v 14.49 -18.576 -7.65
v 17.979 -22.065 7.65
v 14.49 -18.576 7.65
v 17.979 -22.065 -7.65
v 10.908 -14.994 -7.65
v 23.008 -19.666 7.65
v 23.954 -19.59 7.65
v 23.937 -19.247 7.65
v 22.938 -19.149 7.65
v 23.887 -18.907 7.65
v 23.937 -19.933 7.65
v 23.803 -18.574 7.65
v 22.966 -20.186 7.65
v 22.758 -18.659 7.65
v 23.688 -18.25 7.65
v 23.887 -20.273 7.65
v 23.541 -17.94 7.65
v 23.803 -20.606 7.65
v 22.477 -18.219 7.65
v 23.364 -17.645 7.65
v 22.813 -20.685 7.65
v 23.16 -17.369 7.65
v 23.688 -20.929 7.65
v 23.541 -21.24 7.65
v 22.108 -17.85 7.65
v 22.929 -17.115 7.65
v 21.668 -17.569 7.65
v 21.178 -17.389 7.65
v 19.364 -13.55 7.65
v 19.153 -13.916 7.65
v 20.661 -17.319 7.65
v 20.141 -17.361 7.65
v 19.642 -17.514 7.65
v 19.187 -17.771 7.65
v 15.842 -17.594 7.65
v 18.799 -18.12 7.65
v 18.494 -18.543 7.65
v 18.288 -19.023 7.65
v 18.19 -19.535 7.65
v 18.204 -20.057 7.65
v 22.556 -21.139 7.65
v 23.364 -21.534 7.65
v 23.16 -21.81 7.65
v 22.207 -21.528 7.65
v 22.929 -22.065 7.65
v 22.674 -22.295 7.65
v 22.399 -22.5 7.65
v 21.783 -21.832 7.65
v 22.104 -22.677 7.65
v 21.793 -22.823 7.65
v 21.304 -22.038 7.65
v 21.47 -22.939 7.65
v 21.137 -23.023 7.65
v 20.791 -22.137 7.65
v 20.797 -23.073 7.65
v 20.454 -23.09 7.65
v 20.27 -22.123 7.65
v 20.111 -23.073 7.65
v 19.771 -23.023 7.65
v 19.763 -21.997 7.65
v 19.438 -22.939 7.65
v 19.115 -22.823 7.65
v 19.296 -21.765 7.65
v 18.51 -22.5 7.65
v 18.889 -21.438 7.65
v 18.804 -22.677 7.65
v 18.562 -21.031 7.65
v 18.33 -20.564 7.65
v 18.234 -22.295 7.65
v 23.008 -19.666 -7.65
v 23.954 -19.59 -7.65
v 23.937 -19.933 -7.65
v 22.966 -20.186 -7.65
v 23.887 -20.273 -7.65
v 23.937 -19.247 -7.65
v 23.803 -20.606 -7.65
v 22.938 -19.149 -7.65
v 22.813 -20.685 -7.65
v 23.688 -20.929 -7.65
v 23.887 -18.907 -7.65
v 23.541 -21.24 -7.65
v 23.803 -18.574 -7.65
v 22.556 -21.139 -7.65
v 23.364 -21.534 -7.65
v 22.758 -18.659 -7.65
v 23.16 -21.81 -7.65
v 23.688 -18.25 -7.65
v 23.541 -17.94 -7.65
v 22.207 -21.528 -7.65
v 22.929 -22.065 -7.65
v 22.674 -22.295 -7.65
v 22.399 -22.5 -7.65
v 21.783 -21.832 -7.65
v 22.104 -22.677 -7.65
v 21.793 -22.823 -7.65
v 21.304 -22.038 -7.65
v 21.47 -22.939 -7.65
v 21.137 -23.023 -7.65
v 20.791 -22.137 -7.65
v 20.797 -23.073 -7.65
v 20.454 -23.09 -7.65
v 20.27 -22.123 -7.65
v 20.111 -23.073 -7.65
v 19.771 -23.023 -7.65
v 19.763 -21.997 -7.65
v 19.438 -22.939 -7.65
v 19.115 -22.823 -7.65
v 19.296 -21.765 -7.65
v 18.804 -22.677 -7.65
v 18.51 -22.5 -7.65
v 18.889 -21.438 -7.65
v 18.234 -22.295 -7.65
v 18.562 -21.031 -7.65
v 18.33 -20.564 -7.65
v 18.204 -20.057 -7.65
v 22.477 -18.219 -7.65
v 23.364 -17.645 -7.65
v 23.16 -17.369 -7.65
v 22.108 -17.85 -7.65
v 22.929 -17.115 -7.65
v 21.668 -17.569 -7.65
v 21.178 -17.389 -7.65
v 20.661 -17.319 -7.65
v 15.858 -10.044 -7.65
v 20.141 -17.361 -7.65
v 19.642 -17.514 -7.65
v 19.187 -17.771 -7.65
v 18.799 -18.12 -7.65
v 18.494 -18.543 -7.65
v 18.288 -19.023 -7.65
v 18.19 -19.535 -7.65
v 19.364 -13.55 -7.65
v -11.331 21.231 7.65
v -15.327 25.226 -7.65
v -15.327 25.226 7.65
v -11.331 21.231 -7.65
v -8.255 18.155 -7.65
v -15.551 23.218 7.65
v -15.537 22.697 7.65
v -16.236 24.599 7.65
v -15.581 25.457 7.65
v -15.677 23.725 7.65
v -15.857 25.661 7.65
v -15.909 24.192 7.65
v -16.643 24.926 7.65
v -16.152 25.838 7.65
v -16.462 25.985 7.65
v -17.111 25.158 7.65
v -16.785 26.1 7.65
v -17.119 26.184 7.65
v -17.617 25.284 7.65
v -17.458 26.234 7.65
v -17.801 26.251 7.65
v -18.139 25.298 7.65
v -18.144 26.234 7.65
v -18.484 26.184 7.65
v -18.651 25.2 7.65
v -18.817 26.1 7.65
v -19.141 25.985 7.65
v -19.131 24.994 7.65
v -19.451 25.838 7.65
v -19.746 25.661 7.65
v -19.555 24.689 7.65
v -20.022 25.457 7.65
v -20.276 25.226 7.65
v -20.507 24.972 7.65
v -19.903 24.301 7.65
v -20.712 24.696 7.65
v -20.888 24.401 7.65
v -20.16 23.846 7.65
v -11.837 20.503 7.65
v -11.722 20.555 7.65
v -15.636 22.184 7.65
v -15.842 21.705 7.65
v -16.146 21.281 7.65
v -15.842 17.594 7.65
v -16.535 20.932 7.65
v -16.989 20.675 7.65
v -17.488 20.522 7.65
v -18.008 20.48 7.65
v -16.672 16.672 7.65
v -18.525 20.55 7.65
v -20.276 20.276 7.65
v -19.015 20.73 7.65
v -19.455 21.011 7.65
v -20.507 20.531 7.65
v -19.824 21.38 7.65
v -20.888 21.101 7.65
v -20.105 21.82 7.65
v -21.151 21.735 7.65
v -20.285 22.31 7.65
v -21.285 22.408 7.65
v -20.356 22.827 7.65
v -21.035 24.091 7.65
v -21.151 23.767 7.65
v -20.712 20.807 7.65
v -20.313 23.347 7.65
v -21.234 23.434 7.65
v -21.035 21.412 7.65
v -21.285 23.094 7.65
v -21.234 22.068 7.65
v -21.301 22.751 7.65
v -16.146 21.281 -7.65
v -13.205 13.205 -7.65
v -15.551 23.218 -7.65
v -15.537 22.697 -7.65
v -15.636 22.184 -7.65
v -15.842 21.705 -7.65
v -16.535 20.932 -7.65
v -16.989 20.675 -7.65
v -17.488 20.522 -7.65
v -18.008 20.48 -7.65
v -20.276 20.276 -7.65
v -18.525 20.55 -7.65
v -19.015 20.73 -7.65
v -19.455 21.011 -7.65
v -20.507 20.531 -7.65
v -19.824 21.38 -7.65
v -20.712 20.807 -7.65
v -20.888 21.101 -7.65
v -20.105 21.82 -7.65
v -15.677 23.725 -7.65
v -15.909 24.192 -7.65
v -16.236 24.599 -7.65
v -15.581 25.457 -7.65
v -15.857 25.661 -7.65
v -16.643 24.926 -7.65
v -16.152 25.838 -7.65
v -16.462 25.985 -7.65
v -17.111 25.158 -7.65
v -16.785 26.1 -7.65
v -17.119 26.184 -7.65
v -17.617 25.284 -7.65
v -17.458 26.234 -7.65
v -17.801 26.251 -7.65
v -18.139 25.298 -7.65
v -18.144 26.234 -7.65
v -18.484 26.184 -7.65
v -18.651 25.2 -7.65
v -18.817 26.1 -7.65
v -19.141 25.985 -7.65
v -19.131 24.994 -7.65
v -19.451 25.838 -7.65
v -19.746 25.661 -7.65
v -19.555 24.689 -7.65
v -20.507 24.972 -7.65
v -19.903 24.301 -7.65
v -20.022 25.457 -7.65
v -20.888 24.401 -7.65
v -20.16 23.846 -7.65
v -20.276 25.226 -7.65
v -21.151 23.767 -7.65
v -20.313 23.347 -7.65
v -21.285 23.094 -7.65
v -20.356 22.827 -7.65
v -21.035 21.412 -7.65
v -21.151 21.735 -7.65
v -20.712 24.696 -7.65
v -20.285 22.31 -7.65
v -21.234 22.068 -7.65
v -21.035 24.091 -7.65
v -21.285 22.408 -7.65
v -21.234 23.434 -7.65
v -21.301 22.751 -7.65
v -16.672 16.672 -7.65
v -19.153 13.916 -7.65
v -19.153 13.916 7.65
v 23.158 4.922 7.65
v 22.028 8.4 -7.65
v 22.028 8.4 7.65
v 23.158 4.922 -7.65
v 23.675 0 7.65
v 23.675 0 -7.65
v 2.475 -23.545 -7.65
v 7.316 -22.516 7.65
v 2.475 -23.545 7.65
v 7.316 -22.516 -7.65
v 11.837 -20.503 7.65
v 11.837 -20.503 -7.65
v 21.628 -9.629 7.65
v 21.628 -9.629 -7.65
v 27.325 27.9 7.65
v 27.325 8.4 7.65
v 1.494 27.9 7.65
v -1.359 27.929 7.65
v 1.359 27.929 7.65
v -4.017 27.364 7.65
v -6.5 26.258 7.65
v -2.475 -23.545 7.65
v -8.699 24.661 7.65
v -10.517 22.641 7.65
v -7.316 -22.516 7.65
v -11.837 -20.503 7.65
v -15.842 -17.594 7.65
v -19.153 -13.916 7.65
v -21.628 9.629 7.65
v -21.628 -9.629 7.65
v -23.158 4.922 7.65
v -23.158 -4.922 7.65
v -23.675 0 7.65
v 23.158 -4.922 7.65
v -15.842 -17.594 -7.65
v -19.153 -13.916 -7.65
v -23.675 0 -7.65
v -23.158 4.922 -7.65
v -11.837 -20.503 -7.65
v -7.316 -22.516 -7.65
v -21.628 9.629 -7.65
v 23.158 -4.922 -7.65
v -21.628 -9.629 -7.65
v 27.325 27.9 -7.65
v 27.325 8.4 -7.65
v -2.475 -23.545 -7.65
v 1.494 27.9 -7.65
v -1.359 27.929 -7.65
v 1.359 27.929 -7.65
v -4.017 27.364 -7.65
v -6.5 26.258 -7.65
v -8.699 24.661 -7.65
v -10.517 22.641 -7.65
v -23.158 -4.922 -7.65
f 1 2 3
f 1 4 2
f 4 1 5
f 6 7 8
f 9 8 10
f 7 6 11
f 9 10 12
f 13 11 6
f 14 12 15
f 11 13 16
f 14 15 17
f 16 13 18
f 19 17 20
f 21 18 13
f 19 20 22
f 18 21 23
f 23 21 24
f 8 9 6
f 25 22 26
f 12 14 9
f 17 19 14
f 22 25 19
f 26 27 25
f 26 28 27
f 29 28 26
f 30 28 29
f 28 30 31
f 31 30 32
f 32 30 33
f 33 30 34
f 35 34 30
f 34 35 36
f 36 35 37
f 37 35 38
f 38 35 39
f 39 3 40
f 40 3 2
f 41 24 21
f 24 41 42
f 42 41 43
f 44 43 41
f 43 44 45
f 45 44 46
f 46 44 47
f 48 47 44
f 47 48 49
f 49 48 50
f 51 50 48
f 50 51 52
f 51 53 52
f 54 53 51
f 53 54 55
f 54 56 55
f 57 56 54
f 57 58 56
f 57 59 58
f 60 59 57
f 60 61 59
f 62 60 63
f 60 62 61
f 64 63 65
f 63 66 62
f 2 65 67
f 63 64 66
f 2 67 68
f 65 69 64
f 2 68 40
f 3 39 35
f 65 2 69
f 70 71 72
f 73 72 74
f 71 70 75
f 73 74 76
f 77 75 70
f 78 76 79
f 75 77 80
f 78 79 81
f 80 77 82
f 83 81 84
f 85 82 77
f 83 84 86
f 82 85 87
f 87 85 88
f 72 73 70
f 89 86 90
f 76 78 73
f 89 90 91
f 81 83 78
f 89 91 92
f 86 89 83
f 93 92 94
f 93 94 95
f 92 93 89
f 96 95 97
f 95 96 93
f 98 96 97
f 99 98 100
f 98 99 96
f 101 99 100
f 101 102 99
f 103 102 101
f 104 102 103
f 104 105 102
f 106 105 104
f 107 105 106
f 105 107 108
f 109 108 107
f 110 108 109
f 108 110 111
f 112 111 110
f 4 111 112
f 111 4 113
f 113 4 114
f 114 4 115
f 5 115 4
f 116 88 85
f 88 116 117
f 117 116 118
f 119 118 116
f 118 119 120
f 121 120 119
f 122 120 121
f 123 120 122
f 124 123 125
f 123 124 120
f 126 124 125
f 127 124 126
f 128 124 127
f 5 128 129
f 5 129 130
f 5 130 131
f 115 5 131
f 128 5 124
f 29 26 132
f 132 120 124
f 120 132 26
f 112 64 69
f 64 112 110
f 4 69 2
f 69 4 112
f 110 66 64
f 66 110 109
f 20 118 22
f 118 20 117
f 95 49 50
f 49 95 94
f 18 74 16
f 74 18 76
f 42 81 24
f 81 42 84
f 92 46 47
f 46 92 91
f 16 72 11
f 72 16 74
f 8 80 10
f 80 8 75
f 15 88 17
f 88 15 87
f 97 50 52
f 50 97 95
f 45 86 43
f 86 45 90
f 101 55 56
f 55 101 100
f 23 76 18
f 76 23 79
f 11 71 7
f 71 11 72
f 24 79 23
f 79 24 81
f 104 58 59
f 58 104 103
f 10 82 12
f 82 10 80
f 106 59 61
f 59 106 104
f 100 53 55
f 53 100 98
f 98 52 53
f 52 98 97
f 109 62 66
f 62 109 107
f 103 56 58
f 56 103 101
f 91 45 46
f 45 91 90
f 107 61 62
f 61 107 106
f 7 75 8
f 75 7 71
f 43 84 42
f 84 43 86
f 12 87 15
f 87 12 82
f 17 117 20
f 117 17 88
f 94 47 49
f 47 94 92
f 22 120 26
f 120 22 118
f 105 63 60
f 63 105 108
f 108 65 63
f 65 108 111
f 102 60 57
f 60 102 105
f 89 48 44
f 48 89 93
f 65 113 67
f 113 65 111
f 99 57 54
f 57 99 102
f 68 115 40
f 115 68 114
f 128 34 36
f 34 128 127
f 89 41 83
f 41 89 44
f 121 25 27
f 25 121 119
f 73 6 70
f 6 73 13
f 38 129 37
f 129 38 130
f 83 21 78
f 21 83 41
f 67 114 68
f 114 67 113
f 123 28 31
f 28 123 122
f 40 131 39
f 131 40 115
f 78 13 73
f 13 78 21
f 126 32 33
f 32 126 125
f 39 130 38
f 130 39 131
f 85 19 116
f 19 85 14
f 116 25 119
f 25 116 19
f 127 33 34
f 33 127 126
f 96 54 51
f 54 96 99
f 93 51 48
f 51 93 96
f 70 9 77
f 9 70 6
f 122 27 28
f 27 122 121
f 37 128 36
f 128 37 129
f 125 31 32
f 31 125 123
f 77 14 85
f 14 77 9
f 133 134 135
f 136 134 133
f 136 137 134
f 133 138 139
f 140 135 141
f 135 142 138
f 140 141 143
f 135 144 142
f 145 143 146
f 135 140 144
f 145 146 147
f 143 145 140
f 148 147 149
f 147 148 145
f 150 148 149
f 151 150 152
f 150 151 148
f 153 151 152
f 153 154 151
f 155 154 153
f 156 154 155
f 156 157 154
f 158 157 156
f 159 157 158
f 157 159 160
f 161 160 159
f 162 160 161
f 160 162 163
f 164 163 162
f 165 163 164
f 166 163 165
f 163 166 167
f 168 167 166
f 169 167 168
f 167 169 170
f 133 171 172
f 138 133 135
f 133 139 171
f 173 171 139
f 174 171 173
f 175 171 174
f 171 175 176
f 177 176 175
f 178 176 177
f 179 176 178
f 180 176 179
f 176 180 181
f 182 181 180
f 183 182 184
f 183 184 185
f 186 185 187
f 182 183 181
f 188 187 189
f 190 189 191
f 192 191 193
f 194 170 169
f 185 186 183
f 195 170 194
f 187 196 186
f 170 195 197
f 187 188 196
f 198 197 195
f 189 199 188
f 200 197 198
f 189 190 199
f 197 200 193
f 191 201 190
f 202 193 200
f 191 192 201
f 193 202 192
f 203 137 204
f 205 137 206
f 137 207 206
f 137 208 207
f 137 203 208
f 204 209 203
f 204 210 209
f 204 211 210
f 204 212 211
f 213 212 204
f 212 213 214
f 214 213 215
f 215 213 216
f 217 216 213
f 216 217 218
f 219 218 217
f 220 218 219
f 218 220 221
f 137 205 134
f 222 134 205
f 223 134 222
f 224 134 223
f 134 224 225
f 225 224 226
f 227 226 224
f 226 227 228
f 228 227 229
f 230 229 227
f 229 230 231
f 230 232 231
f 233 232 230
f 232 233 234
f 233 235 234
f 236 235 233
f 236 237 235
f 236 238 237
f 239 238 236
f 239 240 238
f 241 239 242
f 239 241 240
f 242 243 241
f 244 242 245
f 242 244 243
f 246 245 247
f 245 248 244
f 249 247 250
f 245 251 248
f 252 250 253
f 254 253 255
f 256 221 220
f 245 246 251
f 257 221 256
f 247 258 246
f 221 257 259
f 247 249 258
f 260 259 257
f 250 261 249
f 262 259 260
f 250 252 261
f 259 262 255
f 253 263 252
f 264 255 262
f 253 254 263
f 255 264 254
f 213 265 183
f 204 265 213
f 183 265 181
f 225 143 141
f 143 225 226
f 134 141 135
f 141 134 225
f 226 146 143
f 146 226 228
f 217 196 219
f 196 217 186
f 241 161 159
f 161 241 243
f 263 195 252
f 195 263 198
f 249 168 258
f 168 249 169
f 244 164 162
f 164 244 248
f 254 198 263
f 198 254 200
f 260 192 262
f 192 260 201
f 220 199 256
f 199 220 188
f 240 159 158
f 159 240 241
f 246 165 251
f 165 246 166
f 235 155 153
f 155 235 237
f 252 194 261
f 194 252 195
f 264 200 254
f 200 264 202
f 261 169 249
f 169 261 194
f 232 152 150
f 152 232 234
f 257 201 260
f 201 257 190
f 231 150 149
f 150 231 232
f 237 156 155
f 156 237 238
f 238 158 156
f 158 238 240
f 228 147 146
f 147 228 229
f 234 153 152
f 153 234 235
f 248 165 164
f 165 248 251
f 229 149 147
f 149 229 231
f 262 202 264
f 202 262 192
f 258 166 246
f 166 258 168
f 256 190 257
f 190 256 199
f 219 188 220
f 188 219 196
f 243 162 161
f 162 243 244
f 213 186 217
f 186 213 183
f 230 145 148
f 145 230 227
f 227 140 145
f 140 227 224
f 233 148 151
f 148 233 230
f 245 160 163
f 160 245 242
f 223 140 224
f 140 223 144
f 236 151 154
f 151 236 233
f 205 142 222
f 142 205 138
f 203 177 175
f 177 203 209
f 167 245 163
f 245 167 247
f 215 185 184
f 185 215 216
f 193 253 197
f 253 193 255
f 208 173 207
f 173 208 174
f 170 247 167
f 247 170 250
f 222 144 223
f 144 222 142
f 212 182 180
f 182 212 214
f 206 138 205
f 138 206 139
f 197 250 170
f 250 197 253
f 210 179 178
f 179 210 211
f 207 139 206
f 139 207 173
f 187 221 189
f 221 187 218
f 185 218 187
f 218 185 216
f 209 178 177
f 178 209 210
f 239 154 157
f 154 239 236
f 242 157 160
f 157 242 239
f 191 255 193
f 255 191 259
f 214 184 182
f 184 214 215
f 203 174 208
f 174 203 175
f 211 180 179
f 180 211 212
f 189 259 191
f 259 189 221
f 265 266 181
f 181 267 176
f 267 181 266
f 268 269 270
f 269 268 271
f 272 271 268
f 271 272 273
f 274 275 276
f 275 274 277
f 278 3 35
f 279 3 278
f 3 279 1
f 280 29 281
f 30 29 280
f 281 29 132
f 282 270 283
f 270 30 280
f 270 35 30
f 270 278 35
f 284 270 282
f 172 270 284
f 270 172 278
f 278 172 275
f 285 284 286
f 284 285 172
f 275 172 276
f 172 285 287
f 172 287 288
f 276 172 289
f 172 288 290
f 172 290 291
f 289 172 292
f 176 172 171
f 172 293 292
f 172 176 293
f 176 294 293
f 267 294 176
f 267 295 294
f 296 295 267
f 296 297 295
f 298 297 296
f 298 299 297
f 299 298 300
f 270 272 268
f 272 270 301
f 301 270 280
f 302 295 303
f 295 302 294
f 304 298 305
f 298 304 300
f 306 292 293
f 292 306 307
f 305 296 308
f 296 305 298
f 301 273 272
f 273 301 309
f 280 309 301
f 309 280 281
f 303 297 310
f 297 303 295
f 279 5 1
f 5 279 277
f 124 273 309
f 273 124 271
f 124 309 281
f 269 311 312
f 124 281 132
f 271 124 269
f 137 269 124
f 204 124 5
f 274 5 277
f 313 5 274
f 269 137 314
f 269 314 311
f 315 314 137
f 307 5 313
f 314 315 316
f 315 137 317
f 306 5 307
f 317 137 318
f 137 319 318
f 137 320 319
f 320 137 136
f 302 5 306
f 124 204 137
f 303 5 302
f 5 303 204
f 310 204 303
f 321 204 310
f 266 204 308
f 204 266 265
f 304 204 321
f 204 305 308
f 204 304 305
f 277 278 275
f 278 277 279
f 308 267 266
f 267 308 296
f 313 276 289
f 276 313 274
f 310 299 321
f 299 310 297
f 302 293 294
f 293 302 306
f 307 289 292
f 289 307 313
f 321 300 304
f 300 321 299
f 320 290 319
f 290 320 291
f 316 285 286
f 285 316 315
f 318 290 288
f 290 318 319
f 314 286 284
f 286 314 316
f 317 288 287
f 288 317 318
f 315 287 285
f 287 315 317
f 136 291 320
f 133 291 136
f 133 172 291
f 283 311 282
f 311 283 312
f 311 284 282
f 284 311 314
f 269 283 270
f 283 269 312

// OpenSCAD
// file: myLibs.scad
pi= 3.14159265359;

module hole(diam, height, clearance= 0.1)
{
        fn= round(diam * pi / 0.5);
        cylinder(h= height, r=diam / 2 / cos(180 / fn) + clearance, $fn=fn);
}

module nutTrap(ffd, faces=6, height=1)
{
	cylinder(h= height, r=ffd / cos(180 / faces) / 2 + 0.05, $fn=faces);
}

// A slot which has rounded ends, but total length is l
module slot(d= 4, l= 8, ht= 1, clearance=0.1) {
	fn= round(d * pi / 0.5);
	rd= d / 2 / cos(180 / fn) + clearance;
	d1= rd*2;
	union() {
		translate([0,0,ht/2]) cube([l-d1, d1, ht], center=true);
		translate([-(l-d1)/2, 0, ht/2]) cylinder(h=ht, r=rd, $fn=fn, center=true); 
		translate([(l-d1)/2, 0, ht/2]) cylinder(h=ht, r=rd, $fn=fn, center=true); 
	}
	
}

/**
 * Standard right-angled triangle
 *
 * @param number o_len Lenght of the opposite side
 * @param number a_len Lenght of the adjacent side
 * @param number depth How wide/deep the triangle is in the 3rd dimension
 * @todo a better way ?
 */
module triangle(o_len, a_len, depth)
{
    linear_extrude(height=depth)
    {
        polygon(points=[[0,0],[a_len,0],[0,o_len]], paths=[[0,1,2]]);
    }
}
// main file
use <myLibs.scad>
dia= 46.45+0.9;
w= 51.75;
h= 51.5;
t= 15.3;
ductl= 19.5;
ductw= 15.5;
ducto= 3.65;
ductx=8.4;
holediag= 58;
holesz= 4.6;
flangew= 7;
flangel= 8.5;

d= dia;
flangepos= [[d/2*sin(55),-d/2*cos(55),-t/2], [-d/2*sin(45),d/2*cos(45),-t/2]];
fan();
//flange();

function get_duct() = [ductw, ductl, 0];

module flange() {
	r= flangew/2;
	translate([0,0,0]) difference() {
		union() {
			cube([flangew, flangel-r, t]);
			translate([r,flangel-r,0]) cylinder(r= r, h= t, $fn=64);
			translate([0,-5,0]) cube([flangew, 5, t]);
		}
		translate([flangew/2,flangel-holesz/2-1,-1]) hole(holesz, t+2);
	}
}

module bigger_radius() {
	x= 13;
	translate([0,x+2,-t/2]) cylinder(r=x, h= t);
}

module fan() {
	union() {
		translate([0,0,-t/2]) cylinder(r=dia/2, h= t);
		bigger_radius();
		translate([0,ductx,-t/2]) cube([dia/2+ducto,ductl,t]);
		translate(flangepos[0]) rotate([0,0,225]) flange();
		translate(flangepos[1]) rotate([0,0,45]) flange();
	}

}
